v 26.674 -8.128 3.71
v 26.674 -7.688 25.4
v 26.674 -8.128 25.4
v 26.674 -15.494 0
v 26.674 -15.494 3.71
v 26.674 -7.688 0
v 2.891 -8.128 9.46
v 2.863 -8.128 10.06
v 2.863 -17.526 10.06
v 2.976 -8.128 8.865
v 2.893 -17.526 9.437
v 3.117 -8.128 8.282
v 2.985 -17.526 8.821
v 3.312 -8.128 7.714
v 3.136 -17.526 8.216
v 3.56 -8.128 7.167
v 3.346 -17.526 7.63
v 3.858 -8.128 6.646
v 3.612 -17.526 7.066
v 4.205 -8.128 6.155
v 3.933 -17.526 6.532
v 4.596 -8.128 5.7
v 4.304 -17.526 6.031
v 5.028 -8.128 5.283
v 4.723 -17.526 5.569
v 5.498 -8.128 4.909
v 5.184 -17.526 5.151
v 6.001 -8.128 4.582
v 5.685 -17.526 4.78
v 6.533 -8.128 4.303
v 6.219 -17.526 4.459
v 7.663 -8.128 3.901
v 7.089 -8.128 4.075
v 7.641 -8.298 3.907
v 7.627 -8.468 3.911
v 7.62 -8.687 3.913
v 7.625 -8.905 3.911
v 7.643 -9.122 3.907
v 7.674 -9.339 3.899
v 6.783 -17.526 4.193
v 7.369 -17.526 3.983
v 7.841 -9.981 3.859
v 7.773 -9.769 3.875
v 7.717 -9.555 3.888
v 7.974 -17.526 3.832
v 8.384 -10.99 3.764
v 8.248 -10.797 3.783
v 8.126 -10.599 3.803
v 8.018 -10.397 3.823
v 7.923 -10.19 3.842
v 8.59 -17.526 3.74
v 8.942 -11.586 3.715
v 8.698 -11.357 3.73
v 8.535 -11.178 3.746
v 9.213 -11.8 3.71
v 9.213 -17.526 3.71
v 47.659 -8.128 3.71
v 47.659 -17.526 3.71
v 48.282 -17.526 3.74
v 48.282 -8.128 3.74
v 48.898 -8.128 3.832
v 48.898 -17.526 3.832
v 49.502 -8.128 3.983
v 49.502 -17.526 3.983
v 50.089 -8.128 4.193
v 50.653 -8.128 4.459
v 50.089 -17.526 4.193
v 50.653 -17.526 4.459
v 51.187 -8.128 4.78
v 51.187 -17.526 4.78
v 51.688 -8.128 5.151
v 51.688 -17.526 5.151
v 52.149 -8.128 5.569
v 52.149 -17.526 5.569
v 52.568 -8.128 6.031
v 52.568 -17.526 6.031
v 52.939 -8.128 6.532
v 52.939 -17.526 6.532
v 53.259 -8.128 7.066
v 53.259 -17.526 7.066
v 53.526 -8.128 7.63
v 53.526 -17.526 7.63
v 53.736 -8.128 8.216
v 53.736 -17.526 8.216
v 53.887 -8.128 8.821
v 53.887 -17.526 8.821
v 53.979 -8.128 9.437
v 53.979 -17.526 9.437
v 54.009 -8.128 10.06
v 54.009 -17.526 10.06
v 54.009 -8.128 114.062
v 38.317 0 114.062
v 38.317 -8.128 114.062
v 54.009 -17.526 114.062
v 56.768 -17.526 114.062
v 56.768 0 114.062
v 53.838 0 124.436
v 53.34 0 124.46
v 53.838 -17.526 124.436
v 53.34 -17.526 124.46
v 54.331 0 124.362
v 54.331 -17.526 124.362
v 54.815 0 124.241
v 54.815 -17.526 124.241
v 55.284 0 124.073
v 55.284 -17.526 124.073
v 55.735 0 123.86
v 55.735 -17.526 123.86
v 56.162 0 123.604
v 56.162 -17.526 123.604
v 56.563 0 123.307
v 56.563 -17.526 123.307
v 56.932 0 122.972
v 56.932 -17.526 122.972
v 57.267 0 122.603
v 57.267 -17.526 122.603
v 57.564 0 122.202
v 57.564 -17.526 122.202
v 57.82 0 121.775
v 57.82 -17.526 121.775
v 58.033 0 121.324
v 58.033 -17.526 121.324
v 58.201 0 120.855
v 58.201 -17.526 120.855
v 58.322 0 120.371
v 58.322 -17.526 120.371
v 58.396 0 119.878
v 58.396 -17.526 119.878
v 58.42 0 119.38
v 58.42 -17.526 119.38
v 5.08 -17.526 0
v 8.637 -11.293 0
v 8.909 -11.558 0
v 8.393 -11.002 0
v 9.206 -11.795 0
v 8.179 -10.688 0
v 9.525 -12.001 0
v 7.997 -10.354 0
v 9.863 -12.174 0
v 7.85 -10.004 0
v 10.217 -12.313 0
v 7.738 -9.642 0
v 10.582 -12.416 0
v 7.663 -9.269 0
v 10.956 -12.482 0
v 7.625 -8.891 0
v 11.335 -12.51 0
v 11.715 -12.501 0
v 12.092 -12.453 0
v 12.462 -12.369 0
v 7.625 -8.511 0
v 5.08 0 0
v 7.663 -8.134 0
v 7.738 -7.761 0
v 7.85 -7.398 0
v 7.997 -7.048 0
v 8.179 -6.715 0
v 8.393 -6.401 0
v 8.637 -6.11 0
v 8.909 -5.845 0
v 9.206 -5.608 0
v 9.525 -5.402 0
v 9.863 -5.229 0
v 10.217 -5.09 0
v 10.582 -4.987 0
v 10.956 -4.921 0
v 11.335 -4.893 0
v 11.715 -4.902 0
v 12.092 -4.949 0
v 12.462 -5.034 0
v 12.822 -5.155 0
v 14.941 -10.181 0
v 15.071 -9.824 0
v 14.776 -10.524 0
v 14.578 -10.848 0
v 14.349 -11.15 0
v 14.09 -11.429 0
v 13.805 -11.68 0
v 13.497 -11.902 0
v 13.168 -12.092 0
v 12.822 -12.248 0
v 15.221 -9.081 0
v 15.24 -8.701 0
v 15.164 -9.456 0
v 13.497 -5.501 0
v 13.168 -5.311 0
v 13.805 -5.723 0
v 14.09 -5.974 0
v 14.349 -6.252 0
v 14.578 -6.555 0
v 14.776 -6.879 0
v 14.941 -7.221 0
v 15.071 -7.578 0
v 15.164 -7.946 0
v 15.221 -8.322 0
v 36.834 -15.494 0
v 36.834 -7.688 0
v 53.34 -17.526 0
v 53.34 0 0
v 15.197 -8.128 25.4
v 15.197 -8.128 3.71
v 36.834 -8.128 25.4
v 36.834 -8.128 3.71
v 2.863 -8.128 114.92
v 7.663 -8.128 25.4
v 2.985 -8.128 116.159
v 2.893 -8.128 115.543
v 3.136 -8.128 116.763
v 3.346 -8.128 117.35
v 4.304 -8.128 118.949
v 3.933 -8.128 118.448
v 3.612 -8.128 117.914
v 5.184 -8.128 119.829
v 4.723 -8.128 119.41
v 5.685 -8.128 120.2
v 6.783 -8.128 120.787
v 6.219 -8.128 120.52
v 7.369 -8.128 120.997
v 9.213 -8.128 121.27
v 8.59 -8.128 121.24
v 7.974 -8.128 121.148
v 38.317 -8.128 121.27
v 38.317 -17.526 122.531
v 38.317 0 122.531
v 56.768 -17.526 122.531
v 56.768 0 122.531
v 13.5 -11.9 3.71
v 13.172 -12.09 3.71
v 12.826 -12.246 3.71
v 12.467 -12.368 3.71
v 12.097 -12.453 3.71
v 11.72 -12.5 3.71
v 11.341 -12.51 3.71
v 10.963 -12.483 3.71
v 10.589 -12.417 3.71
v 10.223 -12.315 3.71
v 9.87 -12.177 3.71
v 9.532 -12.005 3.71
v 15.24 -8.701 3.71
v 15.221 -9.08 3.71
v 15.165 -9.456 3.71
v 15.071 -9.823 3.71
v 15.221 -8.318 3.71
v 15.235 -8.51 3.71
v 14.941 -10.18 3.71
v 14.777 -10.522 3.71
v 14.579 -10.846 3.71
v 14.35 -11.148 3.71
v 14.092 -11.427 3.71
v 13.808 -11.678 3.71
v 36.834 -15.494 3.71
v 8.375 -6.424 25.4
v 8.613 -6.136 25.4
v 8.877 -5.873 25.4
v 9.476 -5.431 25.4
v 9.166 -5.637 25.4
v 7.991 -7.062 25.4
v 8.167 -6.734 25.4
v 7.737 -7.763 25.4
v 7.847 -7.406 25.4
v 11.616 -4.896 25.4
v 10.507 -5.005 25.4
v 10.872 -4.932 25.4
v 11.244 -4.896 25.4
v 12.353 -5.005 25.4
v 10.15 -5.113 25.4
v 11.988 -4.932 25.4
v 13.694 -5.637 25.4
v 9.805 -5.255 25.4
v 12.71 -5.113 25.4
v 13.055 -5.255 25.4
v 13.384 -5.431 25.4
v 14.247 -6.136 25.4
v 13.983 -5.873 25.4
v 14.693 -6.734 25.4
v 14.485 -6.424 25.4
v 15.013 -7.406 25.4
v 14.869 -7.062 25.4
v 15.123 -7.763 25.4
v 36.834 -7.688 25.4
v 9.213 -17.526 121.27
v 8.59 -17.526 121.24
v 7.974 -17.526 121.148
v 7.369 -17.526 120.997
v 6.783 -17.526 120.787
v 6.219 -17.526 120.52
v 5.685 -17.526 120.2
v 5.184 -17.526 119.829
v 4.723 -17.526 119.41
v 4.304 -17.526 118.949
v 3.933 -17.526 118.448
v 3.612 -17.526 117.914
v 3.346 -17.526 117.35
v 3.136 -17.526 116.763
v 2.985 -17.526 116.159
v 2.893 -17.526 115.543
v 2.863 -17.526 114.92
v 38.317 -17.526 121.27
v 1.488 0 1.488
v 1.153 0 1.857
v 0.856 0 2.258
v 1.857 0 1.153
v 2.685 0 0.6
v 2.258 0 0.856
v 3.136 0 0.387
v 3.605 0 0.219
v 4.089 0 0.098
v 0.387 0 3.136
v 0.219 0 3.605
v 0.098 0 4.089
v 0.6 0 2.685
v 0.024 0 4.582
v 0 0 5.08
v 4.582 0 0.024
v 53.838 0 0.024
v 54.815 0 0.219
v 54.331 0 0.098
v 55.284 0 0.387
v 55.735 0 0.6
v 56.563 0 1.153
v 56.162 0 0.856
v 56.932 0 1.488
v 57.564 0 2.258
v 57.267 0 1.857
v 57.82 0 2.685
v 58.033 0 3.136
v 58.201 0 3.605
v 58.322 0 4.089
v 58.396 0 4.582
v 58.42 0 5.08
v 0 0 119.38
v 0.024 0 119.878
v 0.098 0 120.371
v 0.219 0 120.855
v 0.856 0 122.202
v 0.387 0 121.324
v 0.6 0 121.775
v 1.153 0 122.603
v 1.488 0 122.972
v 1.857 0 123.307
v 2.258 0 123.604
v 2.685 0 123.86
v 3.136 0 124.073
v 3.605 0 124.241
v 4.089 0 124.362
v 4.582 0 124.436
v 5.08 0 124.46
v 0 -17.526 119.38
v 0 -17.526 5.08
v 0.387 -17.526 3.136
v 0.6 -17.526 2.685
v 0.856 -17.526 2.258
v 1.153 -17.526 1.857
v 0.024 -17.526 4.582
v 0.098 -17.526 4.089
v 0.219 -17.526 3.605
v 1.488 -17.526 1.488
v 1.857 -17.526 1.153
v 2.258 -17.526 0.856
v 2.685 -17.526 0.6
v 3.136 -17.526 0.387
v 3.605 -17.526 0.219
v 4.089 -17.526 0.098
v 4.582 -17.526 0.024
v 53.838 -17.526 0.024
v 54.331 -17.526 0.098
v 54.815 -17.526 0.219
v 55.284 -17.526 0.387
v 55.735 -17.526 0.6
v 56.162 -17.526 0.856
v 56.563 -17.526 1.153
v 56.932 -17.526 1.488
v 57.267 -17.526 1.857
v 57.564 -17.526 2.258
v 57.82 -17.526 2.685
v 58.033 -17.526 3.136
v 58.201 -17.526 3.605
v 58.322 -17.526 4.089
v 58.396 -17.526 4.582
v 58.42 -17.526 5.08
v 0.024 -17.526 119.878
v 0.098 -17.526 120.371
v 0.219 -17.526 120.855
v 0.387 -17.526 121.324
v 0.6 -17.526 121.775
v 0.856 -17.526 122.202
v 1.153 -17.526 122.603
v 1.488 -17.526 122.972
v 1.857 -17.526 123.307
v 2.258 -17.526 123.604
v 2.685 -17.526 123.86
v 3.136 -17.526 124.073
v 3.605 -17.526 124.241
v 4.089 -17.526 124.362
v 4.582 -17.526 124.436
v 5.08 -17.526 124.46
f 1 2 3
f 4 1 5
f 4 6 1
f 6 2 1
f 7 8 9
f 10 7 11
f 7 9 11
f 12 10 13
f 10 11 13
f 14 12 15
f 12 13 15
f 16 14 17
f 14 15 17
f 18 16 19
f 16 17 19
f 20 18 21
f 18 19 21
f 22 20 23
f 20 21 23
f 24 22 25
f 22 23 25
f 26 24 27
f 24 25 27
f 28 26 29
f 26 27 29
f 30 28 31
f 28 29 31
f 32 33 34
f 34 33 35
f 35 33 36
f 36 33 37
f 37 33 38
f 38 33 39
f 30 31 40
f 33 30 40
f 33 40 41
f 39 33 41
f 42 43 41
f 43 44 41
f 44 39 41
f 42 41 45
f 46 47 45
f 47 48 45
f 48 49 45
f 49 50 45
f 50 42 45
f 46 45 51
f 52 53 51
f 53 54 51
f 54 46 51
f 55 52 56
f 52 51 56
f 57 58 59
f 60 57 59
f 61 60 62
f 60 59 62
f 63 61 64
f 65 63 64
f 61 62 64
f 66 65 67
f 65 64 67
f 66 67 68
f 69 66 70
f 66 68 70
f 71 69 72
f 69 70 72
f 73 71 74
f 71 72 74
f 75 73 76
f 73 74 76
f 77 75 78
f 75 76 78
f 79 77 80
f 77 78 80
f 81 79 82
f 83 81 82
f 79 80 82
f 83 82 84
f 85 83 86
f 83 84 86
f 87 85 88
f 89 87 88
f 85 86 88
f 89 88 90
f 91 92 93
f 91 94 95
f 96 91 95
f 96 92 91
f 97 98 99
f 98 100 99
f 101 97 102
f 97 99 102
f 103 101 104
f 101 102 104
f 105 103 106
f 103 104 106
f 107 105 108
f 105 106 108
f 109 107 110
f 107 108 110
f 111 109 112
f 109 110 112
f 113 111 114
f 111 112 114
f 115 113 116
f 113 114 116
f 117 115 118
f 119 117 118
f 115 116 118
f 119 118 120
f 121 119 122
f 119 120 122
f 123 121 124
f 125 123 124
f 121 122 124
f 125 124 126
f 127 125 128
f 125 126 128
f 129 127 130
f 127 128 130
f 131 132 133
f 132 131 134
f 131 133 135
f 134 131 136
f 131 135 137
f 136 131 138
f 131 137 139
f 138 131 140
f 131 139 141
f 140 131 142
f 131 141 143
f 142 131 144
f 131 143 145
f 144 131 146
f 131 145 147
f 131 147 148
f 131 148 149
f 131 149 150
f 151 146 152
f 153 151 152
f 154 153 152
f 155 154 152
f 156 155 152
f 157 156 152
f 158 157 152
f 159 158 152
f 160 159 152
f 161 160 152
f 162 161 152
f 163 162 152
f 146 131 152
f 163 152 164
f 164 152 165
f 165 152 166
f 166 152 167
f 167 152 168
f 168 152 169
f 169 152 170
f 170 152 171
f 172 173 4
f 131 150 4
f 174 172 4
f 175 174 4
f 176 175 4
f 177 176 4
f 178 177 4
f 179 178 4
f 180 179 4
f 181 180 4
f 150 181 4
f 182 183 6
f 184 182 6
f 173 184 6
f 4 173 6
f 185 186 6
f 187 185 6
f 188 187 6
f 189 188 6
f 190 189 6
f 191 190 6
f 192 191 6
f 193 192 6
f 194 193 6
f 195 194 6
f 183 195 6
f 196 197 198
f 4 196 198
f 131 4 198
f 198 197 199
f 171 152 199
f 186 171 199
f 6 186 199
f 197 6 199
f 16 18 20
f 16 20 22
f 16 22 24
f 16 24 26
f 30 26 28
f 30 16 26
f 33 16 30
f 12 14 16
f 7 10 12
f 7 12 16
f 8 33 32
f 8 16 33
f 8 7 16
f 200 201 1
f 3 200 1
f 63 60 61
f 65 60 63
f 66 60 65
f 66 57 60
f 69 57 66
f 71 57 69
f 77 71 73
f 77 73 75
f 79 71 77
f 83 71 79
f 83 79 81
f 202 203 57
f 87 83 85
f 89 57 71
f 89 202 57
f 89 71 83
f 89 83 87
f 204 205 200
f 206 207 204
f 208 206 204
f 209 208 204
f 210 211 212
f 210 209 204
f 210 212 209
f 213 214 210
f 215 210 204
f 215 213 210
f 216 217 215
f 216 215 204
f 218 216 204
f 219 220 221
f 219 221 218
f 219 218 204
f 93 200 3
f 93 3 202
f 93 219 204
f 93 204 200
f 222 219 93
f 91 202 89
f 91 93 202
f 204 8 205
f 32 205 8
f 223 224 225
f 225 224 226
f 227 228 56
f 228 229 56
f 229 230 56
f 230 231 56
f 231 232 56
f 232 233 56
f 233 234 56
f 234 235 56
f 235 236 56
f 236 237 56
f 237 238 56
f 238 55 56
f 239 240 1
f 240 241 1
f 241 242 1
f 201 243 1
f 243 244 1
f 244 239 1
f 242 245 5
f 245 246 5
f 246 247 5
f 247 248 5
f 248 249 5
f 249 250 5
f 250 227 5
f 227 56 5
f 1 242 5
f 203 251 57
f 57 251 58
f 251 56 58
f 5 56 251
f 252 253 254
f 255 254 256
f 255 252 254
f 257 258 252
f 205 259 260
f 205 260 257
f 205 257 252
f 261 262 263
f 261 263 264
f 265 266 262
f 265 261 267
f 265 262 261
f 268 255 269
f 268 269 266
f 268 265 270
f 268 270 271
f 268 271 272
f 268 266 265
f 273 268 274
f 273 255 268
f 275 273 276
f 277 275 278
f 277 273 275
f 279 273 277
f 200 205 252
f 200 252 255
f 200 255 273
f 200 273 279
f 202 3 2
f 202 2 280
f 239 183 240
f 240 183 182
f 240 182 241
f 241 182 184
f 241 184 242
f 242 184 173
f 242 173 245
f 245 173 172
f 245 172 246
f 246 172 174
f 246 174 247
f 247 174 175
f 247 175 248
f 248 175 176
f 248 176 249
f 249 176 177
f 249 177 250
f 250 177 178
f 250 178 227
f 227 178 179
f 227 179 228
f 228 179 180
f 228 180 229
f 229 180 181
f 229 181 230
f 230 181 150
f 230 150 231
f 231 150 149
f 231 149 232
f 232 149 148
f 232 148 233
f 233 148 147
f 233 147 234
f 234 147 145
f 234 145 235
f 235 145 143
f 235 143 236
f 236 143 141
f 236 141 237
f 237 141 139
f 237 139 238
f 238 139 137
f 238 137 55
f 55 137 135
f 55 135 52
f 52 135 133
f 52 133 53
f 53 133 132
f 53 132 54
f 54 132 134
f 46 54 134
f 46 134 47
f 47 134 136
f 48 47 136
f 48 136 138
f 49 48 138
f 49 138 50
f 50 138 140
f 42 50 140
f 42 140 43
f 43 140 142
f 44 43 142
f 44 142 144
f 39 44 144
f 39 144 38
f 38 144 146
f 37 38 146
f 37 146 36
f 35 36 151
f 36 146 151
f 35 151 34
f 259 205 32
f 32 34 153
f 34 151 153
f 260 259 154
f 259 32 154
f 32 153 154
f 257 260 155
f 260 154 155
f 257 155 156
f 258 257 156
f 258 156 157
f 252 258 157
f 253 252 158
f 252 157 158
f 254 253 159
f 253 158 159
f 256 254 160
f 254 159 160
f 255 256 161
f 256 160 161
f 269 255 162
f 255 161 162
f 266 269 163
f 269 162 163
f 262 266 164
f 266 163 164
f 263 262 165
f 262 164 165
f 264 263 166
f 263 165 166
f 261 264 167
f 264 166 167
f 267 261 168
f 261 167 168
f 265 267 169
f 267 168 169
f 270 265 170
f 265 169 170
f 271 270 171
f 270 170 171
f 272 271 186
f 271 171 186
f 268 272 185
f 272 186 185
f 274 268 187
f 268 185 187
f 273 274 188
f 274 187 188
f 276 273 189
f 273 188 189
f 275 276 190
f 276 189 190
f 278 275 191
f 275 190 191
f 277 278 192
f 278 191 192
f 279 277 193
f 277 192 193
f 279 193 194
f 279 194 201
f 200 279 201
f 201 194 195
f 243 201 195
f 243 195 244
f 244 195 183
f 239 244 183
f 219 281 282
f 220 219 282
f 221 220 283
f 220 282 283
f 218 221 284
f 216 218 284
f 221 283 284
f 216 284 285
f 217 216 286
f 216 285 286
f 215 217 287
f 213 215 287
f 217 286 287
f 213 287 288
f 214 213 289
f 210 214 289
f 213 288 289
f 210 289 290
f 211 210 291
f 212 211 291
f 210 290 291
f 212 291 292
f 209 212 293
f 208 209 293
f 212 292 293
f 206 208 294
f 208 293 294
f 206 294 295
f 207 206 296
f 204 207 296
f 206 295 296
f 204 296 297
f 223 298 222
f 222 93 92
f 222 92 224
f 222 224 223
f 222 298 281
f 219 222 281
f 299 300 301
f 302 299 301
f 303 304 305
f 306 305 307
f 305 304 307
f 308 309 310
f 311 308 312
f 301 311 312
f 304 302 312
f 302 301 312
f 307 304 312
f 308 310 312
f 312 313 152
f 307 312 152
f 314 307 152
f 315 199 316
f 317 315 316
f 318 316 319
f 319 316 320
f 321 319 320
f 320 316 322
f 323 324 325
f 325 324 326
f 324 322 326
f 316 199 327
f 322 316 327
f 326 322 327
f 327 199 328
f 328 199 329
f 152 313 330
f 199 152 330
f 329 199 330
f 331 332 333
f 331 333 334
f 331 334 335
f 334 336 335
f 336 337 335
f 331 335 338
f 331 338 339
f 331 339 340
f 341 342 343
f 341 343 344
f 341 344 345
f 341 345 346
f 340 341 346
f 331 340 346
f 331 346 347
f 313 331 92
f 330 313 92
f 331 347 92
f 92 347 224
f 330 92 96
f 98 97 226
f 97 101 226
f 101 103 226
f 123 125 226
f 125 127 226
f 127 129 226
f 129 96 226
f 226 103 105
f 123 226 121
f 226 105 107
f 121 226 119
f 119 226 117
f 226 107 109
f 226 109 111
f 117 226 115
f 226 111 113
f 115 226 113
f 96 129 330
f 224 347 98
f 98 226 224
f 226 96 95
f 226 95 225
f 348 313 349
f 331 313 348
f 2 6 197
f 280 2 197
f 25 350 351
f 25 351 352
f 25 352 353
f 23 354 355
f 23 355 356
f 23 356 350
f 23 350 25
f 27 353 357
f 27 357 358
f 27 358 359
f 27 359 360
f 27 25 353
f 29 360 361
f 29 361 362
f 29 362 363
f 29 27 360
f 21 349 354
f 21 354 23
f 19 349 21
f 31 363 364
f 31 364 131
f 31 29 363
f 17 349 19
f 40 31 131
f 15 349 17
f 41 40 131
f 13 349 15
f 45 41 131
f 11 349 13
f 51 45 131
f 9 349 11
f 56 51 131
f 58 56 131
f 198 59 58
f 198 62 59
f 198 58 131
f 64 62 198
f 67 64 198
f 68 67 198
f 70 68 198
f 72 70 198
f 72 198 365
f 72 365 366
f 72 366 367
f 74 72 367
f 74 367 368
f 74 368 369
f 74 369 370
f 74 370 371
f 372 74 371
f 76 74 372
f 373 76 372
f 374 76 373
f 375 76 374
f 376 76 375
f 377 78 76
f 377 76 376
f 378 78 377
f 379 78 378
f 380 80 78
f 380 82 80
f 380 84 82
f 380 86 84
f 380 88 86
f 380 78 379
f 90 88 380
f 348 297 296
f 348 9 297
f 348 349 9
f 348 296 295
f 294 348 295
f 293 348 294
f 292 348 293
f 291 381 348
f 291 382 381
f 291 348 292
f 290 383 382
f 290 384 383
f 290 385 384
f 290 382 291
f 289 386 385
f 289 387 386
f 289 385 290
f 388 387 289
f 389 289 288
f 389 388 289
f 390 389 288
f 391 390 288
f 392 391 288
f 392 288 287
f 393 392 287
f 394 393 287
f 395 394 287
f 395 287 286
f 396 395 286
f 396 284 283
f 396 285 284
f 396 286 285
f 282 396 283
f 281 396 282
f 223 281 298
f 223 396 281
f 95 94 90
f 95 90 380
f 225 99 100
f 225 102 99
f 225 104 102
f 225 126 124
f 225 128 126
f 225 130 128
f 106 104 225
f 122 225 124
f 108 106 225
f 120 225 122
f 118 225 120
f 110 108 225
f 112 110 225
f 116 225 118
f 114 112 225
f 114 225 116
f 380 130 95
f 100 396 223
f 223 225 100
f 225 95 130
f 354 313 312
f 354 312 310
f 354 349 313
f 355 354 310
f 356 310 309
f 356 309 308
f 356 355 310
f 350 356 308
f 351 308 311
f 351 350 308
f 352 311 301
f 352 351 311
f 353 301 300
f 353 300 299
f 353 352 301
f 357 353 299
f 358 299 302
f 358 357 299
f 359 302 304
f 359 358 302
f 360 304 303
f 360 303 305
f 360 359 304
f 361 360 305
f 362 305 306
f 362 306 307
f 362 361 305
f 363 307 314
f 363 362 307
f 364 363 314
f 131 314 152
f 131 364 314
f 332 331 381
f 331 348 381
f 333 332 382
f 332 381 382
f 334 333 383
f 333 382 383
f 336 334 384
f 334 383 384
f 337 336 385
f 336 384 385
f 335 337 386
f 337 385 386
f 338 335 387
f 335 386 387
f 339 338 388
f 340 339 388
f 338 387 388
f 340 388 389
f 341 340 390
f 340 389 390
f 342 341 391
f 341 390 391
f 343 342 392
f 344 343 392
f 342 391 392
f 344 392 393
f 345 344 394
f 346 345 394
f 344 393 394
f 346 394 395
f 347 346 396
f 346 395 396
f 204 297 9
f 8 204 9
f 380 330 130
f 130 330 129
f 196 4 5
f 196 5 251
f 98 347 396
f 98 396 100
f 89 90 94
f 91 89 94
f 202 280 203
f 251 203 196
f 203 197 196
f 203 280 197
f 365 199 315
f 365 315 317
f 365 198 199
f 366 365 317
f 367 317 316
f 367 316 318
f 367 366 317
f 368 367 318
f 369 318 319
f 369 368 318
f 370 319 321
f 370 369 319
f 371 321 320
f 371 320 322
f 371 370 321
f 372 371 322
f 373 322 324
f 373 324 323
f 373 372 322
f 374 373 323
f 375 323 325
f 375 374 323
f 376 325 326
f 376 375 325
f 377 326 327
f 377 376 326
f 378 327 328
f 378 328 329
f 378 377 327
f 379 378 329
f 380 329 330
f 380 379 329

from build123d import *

# Parameters (mm, degrees)
F0_W     = 58.42
F0_H     = 124.46
F1_DEPTH = 17.526
F3_DEPTH = 9.398
F6_R     = 5.08
F4_W     = 18.451236
F4_H     = 8.469313
F7_DEPTH = 25.4
F5_R     = 3.81
F5_W     = 10.16
F5_H     = 7.80597
F8_DEPTH = 25.4


with BuildPart() as f1:
    # F0 (on Front) → F1 (new body)
    with BuildSketch(Plane.XZ):
        with Locations((29.21, 62.23)):
            Rectangle(F0_W, F0_H)
    extrude(amount=F1_DEPTH)

    # F2 (on face) → F3 (cut)
    with BuildSketch(Plane.XZ.offset(17.526)):
        with BuildLine():
            ThreePointArc((2.862678, 10.059572), (4.72255, 5.569444), (9.212678, 3.709572))
            Line((9.212678, 3.709572), (47.659166, 3.709572))
            ThreePointArc((47.659166, 3.709572), (52.149294, 5.569444), (54.009166, 10.059572))
            Line((54.009166, 10.059572), (54.009166, 114.920157))
            ThreePointArc((54.009166, 114.920157), (52.149294, 119.410285), (47.659166, 121.270157))
            Line((47.659166, 121.270157), (9.212678, 121.270157))
            ThreePointArc((9.212678, 121.270157), (4.72255, 119.410285), (2.862678, 114.920157))
            Line((2.862678, 114.920157), (2.862678, 10.059572))
        make_face()
    extrude(amount=-F3_DEPTH, mode=Mode.SUBTRACT)

    # F6
    f6_edges = [f1.edges().sort_by_distance(p)[0] for p in [
        (0, -8.763, 124.46),
        (58.42, -8.763, 124.46),
        (58.42, -8.763, 0),
        (0, -8.763, 0),
    ]]
    fillet(f6_edges, radius=F6_R)

    # F4 (on Front) → F7 (cut)
    with BuildSketch(Plane.XZ):
        with Locations((47.542691, 118.296183)):
            Rectangle(F4_W, F4_H)
    extrude(amount=F7_DEPTH, mode=Mode.SUBTRACT)

    # F5 (on face) → F8 (cut)
    with BuildSketch(Plane(origin=(0, 0, 0), x_dir=(1, 0, 0), z_dir=(0, 0, -1))):
        with Locations((11.43, 8.70138)):
            Circle(F5_R)
        with Locations((31.753567, 11.591015)):
            Rectangle(F5_W, F5_H)
    extrude(amount=-F8_DEPTH, mode=Mode.SUBTRACT)


solid = f1.part
